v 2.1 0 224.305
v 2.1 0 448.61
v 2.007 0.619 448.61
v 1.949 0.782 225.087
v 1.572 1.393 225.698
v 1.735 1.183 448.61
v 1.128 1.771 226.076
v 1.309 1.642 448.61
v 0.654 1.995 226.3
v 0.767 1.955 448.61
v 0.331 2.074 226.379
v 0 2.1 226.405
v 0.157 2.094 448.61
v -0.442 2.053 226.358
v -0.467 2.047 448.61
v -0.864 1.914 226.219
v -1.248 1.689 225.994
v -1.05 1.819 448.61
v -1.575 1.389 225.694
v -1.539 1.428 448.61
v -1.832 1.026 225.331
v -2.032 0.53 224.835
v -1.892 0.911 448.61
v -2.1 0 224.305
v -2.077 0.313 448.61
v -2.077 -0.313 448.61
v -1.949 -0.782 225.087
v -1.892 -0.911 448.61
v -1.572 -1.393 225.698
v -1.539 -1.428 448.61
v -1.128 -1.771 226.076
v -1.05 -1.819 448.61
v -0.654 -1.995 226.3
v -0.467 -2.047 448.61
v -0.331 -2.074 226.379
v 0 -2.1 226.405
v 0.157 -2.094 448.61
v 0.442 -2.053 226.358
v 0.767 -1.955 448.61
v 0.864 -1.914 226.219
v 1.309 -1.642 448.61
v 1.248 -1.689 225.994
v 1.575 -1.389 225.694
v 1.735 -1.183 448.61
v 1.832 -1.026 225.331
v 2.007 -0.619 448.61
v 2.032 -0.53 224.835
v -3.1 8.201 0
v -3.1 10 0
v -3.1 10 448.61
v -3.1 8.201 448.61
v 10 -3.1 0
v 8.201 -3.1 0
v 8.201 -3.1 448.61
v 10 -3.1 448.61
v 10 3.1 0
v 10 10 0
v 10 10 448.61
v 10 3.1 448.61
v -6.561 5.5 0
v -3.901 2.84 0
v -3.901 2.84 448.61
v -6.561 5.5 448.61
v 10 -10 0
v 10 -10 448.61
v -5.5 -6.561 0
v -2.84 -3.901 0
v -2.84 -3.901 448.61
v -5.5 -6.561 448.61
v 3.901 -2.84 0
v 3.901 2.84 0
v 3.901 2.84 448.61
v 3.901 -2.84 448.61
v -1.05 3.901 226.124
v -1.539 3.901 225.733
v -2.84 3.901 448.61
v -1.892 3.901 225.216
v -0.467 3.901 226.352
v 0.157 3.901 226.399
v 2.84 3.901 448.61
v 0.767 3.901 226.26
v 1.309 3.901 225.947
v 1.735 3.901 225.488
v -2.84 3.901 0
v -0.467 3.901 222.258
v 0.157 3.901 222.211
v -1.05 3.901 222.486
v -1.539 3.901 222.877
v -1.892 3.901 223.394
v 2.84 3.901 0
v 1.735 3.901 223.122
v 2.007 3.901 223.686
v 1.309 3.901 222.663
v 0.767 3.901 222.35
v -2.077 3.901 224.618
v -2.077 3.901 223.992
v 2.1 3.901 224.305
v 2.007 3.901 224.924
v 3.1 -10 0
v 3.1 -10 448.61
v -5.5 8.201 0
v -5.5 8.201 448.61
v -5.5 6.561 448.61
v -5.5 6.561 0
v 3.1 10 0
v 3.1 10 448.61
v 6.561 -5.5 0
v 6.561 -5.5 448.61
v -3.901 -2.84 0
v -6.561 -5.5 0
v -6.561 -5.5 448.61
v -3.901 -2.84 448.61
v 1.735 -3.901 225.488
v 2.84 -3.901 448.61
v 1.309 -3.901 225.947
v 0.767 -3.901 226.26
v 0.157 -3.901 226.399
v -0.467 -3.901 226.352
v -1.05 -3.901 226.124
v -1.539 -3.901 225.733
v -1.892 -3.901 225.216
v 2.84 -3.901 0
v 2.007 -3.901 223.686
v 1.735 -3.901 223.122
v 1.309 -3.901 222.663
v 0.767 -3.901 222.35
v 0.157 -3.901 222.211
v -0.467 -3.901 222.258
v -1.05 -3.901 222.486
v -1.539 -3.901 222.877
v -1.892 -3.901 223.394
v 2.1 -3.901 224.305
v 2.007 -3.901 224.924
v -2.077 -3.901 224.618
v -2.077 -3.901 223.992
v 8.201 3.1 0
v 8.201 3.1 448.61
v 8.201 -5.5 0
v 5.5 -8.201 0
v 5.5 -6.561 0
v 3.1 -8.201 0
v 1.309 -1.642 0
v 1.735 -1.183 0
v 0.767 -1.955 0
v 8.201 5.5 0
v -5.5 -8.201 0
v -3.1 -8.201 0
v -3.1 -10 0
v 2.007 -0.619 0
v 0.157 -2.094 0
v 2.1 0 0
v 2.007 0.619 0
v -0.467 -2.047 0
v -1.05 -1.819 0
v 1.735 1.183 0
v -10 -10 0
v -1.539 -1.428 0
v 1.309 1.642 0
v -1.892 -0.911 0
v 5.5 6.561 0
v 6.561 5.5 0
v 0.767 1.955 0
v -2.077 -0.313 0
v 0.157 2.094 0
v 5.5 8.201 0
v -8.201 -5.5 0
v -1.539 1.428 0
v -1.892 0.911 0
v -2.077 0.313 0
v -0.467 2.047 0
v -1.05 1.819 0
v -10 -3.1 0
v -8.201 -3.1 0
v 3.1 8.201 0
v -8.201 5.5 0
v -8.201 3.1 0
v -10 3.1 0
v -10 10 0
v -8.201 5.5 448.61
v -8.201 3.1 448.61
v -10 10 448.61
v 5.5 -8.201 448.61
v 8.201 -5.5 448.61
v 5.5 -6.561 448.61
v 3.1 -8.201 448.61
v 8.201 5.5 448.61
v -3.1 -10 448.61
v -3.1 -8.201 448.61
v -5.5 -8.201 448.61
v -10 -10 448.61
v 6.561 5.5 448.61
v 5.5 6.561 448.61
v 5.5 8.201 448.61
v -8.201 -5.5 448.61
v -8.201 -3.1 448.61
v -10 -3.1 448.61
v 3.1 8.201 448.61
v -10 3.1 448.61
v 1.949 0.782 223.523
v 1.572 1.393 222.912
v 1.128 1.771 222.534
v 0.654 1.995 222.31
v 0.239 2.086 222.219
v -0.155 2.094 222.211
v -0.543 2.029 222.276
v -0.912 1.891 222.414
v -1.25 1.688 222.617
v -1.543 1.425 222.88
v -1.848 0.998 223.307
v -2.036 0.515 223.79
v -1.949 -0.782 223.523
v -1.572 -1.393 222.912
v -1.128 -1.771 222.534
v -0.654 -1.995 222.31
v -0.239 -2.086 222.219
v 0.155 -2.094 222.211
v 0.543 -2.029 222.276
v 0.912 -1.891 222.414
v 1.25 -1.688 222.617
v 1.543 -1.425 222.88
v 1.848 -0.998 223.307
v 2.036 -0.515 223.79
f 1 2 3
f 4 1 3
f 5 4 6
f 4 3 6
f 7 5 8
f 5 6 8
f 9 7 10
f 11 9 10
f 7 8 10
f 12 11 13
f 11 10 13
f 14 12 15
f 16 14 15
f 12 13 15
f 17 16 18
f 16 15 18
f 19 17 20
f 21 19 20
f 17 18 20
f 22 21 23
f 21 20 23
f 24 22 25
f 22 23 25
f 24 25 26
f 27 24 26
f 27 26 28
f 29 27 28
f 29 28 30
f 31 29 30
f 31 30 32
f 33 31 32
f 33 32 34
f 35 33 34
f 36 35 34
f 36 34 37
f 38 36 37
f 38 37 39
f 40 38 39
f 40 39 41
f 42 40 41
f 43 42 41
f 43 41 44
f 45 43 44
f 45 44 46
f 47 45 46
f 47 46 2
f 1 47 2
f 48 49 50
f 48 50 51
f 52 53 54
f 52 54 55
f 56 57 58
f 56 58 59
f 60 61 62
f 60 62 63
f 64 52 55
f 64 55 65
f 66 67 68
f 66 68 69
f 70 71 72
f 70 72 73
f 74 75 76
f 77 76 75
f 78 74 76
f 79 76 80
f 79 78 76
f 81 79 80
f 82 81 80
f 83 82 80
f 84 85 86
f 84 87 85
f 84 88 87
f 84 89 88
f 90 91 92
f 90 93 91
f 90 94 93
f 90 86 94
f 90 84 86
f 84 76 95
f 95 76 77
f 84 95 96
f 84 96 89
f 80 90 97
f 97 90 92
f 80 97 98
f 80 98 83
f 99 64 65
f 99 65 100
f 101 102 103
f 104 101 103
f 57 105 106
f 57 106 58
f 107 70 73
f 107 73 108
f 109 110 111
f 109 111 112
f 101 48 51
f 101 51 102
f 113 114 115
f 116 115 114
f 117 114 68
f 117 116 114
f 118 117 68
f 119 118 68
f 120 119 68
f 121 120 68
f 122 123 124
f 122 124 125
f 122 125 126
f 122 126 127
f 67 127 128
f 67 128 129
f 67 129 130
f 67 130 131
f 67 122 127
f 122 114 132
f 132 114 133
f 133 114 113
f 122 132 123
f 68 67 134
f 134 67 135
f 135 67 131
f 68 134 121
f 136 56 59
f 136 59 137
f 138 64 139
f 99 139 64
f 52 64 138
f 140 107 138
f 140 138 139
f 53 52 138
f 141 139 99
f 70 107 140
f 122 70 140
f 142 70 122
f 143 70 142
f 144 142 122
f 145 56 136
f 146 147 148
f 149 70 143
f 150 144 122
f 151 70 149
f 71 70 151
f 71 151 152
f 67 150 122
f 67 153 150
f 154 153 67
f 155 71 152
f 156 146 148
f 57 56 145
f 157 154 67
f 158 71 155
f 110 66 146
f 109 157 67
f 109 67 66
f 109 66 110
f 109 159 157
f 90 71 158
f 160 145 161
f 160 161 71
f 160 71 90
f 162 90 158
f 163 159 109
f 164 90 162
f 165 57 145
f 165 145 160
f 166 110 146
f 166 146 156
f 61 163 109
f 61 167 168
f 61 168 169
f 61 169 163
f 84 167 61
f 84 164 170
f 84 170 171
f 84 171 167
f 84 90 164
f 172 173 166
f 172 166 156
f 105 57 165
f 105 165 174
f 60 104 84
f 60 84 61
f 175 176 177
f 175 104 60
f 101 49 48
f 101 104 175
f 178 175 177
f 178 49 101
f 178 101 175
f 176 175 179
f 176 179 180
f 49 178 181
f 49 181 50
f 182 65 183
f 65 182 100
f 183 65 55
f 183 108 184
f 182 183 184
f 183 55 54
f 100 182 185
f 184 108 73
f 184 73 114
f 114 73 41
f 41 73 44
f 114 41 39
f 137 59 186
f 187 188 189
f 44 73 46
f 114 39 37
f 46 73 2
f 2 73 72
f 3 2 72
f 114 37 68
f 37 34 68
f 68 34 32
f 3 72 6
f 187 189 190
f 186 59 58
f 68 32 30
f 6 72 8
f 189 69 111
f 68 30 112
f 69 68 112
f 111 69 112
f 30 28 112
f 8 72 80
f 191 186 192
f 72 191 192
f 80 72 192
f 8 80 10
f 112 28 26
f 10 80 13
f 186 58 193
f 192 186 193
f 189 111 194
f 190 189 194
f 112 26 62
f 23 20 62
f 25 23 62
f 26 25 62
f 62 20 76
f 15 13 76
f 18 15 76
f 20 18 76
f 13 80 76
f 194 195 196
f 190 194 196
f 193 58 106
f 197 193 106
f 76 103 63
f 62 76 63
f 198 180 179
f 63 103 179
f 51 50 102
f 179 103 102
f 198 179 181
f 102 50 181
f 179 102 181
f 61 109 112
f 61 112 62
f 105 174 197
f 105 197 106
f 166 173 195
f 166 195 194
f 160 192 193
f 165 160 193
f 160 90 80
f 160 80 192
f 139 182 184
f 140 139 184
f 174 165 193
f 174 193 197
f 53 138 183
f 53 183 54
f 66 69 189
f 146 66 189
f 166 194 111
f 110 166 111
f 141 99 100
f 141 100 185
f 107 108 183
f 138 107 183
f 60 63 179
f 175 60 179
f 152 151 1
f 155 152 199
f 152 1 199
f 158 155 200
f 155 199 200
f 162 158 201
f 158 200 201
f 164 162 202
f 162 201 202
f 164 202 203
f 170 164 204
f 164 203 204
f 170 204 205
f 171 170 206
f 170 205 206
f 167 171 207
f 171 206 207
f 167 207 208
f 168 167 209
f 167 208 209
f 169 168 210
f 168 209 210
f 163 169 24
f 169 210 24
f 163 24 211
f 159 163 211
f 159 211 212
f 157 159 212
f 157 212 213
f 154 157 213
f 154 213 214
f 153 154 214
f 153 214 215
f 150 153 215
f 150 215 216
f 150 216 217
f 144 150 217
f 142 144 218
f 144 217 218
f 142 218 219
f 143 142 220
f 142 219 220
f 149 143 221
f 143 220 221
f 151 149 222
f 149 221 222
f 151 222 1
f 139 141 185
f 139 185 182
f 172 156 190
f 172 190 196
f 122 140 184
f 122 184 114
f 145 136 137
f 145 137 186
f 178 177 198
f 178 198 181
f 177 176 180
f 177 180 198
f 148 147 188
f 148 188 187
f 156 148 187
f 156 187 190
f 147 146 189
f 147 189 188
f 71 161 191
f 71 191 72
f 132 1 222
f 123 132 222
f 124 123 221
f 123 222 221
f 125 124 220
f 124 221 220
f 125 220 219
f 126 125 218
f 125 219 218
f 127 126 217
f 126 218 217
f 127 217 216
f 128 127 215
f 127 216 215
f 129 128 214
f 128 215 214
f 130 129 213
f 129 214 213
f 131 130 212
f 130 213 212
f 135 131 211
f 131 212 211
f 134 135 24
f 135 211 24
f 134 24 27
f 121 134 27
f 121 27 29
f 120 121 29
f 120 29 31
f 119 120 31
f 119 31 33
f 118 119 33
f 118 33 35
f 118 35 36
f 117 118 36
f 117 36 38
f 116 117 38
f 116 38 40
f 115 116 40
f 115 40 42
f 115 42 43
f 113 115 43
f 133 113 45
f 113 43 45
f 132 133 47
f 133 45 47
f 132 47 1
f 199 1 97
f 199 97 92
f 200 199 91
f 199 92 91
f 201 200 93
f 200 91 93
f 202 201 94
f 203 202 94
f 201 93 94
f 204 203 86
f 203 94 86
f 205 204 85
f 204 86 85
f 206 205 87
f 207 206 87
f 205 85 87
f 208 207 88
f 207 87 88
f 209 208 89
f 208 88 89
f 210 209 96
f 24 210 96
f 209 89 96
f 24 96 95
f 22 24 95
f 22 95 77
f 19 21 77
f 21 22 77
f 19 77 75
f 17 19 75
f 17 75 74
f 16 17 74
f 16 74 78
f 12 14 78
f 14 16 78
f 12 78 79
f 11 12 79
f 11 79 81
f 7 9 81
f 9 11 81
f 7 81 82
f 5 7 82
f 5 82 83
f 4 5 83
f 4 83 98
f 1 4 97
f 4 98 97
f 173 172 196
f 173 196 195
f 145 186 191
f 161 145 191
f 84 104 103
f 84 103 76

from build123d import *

# Parameters (mm, degrees)
BOSS_EXTRUDE1_DEPTH = 448.61
SKETCH2_R           = 2.1
CUT_EXTRUDE1_DEPTH  = 449.61
SKETCH3_R           = 2.1
CUT_EXTRUDE2_DEPTH  = 14.900660172


with BuildPart() as part:
    # Sketch1 → Boss-Extrude1 (new body)
    with BuildSketch(Plane.XY):
        Polygon((-3.1, 10), (-3.1, 8.200660172), (-5.5, 8.200660172), (-5.5, 6.560660172), (-2.84, 3.900660172), (2.84, 3.900660172), (5.5, 6.560660172), (5.5, 8.200660172), (3.1, 8.200660172), (3.1, 10), (10, 10), (10, 3.1), (8.200660172, 3.1), (8.200660172, 5.5), (6.560660172, 5.5), (3.900660172, 2.84), (3.900660172, -2.84), (6.560660172, -5.5), (8.200660172, -5.5), (8.200660172, -3.1), (10, -3.1), (10, -10), (3.1, -10), (3.1, -8.200660172), (5.5, -8.200660172), (5.5, -6.560660172), (2.84, -3.900660172), (-2.84, -3.900660172), (-5.5, -6.560660172), (-5.5, -8.200660172), (-3.1, -8.200660172), (-3.1, -10), (-10, -10), (-10, -3.1), (-8.200660172, -3.1), (-8.200660172, -5.5), (-6.560660172, -5.5), (-3.900660172, -2.84), (-3.900660172, 2.84), (-6.560660172, 5.5), (-8.200660172, 5.5), (-8.200660172, 3.1), (-10, 3.1), (-10, 10), align=None)
    extrude(amount=BOSS_EXTRUDE1_DEPTH)

    # Sketch2 → Cut-Extrude1 (cut, through all)
    with BuildSketch(Plane.XY.offset(448.61)):
        Circle(SKETCH2_R)
    extrude(amount=-CUT_EXTRUDE1_DEPTH, mode=Mode.SUBTRACT)

    # Sketch3 → Cut-Extrude2 (cut, through all)
    with BuildSketch(Plane(origin=(0, 3.900660172, 0), x_dir=(1, 0, 0), z_dir=(0, 1, 0))):
        with Locations((0, -224.305)):
            Circle(SKETCH3_R)
    extrude(amount=-CUT_EXTRUDE2_DEPTH, mode=Mode.SUBTRACT)


solid = part.part
